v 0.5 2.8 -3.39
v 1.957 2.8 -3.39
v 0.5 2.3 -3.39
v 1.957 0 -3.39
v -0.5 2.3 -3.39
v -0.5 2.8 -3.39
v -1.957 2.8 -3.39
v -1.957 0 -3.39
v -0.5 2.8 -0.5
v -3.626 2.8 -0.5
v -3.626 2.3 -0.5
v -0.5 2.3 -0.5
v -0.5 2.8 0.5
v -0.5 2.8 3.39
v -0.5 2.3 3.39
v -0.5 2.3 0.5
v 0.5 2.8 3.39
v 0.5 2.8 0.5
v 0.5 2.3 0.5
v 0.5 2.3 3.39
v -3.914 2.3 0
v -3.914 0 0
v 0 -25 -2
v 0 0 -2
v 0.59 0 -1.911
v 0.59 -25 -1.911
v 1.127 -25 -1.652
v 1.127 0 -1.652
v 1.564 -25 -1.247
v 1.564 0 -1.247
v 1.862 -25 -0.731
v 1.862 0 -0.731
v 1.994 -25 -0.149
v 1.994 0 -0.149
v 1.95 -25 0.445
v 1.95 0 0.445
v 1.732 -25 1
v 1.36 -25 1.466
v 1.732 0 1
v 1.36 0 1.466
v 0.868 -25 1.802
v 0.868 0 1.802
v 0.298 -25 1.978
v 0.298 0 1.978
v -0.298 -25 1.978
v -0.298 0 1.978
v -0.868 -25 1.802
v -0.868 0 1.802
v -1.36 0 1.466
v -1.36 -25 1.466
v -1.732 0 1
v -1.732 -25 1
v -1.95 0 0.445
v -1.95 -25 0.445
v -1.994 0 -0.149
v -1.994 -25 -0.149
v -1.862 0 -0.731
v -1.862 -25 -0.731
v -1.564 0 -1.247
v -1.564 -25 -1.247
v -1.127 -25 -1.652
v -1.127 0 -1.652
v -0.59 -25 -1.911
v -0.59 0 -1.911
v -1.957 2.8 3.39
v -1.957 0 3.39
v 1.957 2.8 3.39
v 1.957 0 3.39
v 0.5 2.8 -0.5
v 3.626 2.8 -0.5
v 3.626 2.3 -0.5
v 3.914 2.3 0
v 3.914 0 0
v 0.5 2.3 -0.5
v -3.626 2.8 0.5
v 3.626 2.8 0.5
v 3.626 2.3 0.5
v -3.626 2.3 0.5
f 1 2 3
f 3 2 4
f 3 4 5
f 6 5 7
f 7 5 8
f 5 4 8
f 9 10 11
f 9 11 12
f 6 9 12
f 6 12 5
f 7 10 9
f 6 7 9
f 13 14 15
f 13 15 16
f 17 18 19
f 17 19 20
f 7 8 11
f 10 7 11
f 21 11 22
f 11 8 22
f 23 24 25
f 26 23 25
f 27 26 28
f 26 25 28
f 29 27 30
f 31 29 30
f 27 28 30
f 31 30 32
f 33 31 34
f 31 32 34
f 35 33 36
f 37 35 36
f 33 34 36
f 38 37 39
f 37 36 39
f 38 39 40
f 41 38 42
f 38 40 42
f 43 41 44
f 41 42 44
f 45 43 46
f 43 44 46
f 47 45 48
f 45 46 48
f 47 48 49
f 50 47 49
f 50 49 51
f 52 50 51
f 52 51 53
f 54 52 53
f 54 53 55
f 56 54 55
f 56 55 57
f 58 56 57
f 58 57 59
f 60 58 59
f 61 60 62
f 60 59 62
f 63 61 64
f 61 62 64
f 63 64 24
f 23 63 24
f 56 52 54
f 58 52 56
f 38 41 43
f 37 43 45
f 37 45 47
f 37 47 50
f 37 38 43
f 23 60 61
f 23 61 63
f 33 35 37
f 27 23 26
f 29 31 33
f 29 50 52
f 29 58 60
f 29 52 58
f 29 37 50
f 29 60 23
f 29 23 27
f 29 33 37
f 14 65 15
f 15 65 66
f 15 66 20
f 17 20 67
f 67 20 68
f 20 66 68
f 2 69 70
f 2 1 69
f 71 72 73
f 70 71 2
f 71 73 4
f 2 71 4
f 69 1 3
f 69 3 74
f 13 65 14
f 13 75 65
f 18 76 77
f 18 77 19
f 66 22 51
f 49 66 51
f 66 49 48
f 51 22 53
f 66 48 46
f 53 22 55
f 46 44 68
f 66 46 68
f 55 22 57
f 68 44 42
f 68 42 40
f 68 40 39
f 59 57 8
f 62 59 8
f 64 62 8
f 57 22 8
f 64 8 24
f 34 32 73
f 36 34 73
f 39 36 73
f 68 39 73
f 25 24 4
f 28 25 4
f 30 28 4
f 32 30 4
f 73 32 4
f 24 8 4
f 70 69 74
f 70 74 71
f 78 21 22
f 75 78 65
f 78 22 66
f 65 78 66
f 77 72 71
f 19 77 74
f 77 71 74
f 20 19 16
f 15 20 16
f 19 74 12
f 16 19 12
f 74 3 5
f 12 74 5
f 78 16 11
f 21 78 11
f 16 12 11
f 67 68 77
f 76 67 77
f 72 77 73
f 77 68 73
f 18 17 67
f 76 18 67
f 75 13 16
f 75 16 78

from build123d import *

# Parameters (mm, degrees)
BOSS_EXTRUDE1_DEPTH = 2.8
CUT_EXTRUDE1_DEPTH  = 0.5
SKETCH3_R           = 2
BOSS_EXTRUDE2_DEPTH = 25


with BuildPart() as part:
    # Sketch1 → Boss-Extrude1 (new body)
    with BuildSketch(Plane(origin=(0, 0, 0), x_dir=(1, 0, 0), z_dir=(0, 1, 0))):
        Polygon((1.957217413, -3.39), (3.914434825, 0), (1.957217413, 3.39), (-1.957217413, 3.39), (-3.914434825, 0), (-1.957217413, -3.39), align=None)
    extrude(amount=BOSS_EXTRUDE1_DEPTH)

    # Sketch2 → Cut-Extrude1 (cut)
    with BuildSketch(Plane(origin=(0, 2.8, 0), x_dir=(1, 0, 0), z_dir=(0, 1, 0))):
        Polygon((-0.5, 3.39), (0.5, 3.39), (0.5, 0.5), (3.914434825, 0.5), (3.914434825, -0.5), (0.5, -0.5), (0.5, -3.39), (-0.5, -3.39), (-0.5, -0.5), (-3.914434825, -0.5), (-3.914434825, 0.5), (-0.5, 0.5), align=None)
    extrude(amount=-CUT_EXTRUDE1_DEPTH, mode=Mode.SUBTRACT)

    # Sketch3 → Boss-Extrude2 (add)
    with BuildSketch(Plane.XZ):
        with Locations(Location((0, 0, 0), (0, 0, 270))):
            Circle(SKETCH3_R)
    extrude(amount=BOSS_EXTRUDE2_DEPTH)


solid = part.part
